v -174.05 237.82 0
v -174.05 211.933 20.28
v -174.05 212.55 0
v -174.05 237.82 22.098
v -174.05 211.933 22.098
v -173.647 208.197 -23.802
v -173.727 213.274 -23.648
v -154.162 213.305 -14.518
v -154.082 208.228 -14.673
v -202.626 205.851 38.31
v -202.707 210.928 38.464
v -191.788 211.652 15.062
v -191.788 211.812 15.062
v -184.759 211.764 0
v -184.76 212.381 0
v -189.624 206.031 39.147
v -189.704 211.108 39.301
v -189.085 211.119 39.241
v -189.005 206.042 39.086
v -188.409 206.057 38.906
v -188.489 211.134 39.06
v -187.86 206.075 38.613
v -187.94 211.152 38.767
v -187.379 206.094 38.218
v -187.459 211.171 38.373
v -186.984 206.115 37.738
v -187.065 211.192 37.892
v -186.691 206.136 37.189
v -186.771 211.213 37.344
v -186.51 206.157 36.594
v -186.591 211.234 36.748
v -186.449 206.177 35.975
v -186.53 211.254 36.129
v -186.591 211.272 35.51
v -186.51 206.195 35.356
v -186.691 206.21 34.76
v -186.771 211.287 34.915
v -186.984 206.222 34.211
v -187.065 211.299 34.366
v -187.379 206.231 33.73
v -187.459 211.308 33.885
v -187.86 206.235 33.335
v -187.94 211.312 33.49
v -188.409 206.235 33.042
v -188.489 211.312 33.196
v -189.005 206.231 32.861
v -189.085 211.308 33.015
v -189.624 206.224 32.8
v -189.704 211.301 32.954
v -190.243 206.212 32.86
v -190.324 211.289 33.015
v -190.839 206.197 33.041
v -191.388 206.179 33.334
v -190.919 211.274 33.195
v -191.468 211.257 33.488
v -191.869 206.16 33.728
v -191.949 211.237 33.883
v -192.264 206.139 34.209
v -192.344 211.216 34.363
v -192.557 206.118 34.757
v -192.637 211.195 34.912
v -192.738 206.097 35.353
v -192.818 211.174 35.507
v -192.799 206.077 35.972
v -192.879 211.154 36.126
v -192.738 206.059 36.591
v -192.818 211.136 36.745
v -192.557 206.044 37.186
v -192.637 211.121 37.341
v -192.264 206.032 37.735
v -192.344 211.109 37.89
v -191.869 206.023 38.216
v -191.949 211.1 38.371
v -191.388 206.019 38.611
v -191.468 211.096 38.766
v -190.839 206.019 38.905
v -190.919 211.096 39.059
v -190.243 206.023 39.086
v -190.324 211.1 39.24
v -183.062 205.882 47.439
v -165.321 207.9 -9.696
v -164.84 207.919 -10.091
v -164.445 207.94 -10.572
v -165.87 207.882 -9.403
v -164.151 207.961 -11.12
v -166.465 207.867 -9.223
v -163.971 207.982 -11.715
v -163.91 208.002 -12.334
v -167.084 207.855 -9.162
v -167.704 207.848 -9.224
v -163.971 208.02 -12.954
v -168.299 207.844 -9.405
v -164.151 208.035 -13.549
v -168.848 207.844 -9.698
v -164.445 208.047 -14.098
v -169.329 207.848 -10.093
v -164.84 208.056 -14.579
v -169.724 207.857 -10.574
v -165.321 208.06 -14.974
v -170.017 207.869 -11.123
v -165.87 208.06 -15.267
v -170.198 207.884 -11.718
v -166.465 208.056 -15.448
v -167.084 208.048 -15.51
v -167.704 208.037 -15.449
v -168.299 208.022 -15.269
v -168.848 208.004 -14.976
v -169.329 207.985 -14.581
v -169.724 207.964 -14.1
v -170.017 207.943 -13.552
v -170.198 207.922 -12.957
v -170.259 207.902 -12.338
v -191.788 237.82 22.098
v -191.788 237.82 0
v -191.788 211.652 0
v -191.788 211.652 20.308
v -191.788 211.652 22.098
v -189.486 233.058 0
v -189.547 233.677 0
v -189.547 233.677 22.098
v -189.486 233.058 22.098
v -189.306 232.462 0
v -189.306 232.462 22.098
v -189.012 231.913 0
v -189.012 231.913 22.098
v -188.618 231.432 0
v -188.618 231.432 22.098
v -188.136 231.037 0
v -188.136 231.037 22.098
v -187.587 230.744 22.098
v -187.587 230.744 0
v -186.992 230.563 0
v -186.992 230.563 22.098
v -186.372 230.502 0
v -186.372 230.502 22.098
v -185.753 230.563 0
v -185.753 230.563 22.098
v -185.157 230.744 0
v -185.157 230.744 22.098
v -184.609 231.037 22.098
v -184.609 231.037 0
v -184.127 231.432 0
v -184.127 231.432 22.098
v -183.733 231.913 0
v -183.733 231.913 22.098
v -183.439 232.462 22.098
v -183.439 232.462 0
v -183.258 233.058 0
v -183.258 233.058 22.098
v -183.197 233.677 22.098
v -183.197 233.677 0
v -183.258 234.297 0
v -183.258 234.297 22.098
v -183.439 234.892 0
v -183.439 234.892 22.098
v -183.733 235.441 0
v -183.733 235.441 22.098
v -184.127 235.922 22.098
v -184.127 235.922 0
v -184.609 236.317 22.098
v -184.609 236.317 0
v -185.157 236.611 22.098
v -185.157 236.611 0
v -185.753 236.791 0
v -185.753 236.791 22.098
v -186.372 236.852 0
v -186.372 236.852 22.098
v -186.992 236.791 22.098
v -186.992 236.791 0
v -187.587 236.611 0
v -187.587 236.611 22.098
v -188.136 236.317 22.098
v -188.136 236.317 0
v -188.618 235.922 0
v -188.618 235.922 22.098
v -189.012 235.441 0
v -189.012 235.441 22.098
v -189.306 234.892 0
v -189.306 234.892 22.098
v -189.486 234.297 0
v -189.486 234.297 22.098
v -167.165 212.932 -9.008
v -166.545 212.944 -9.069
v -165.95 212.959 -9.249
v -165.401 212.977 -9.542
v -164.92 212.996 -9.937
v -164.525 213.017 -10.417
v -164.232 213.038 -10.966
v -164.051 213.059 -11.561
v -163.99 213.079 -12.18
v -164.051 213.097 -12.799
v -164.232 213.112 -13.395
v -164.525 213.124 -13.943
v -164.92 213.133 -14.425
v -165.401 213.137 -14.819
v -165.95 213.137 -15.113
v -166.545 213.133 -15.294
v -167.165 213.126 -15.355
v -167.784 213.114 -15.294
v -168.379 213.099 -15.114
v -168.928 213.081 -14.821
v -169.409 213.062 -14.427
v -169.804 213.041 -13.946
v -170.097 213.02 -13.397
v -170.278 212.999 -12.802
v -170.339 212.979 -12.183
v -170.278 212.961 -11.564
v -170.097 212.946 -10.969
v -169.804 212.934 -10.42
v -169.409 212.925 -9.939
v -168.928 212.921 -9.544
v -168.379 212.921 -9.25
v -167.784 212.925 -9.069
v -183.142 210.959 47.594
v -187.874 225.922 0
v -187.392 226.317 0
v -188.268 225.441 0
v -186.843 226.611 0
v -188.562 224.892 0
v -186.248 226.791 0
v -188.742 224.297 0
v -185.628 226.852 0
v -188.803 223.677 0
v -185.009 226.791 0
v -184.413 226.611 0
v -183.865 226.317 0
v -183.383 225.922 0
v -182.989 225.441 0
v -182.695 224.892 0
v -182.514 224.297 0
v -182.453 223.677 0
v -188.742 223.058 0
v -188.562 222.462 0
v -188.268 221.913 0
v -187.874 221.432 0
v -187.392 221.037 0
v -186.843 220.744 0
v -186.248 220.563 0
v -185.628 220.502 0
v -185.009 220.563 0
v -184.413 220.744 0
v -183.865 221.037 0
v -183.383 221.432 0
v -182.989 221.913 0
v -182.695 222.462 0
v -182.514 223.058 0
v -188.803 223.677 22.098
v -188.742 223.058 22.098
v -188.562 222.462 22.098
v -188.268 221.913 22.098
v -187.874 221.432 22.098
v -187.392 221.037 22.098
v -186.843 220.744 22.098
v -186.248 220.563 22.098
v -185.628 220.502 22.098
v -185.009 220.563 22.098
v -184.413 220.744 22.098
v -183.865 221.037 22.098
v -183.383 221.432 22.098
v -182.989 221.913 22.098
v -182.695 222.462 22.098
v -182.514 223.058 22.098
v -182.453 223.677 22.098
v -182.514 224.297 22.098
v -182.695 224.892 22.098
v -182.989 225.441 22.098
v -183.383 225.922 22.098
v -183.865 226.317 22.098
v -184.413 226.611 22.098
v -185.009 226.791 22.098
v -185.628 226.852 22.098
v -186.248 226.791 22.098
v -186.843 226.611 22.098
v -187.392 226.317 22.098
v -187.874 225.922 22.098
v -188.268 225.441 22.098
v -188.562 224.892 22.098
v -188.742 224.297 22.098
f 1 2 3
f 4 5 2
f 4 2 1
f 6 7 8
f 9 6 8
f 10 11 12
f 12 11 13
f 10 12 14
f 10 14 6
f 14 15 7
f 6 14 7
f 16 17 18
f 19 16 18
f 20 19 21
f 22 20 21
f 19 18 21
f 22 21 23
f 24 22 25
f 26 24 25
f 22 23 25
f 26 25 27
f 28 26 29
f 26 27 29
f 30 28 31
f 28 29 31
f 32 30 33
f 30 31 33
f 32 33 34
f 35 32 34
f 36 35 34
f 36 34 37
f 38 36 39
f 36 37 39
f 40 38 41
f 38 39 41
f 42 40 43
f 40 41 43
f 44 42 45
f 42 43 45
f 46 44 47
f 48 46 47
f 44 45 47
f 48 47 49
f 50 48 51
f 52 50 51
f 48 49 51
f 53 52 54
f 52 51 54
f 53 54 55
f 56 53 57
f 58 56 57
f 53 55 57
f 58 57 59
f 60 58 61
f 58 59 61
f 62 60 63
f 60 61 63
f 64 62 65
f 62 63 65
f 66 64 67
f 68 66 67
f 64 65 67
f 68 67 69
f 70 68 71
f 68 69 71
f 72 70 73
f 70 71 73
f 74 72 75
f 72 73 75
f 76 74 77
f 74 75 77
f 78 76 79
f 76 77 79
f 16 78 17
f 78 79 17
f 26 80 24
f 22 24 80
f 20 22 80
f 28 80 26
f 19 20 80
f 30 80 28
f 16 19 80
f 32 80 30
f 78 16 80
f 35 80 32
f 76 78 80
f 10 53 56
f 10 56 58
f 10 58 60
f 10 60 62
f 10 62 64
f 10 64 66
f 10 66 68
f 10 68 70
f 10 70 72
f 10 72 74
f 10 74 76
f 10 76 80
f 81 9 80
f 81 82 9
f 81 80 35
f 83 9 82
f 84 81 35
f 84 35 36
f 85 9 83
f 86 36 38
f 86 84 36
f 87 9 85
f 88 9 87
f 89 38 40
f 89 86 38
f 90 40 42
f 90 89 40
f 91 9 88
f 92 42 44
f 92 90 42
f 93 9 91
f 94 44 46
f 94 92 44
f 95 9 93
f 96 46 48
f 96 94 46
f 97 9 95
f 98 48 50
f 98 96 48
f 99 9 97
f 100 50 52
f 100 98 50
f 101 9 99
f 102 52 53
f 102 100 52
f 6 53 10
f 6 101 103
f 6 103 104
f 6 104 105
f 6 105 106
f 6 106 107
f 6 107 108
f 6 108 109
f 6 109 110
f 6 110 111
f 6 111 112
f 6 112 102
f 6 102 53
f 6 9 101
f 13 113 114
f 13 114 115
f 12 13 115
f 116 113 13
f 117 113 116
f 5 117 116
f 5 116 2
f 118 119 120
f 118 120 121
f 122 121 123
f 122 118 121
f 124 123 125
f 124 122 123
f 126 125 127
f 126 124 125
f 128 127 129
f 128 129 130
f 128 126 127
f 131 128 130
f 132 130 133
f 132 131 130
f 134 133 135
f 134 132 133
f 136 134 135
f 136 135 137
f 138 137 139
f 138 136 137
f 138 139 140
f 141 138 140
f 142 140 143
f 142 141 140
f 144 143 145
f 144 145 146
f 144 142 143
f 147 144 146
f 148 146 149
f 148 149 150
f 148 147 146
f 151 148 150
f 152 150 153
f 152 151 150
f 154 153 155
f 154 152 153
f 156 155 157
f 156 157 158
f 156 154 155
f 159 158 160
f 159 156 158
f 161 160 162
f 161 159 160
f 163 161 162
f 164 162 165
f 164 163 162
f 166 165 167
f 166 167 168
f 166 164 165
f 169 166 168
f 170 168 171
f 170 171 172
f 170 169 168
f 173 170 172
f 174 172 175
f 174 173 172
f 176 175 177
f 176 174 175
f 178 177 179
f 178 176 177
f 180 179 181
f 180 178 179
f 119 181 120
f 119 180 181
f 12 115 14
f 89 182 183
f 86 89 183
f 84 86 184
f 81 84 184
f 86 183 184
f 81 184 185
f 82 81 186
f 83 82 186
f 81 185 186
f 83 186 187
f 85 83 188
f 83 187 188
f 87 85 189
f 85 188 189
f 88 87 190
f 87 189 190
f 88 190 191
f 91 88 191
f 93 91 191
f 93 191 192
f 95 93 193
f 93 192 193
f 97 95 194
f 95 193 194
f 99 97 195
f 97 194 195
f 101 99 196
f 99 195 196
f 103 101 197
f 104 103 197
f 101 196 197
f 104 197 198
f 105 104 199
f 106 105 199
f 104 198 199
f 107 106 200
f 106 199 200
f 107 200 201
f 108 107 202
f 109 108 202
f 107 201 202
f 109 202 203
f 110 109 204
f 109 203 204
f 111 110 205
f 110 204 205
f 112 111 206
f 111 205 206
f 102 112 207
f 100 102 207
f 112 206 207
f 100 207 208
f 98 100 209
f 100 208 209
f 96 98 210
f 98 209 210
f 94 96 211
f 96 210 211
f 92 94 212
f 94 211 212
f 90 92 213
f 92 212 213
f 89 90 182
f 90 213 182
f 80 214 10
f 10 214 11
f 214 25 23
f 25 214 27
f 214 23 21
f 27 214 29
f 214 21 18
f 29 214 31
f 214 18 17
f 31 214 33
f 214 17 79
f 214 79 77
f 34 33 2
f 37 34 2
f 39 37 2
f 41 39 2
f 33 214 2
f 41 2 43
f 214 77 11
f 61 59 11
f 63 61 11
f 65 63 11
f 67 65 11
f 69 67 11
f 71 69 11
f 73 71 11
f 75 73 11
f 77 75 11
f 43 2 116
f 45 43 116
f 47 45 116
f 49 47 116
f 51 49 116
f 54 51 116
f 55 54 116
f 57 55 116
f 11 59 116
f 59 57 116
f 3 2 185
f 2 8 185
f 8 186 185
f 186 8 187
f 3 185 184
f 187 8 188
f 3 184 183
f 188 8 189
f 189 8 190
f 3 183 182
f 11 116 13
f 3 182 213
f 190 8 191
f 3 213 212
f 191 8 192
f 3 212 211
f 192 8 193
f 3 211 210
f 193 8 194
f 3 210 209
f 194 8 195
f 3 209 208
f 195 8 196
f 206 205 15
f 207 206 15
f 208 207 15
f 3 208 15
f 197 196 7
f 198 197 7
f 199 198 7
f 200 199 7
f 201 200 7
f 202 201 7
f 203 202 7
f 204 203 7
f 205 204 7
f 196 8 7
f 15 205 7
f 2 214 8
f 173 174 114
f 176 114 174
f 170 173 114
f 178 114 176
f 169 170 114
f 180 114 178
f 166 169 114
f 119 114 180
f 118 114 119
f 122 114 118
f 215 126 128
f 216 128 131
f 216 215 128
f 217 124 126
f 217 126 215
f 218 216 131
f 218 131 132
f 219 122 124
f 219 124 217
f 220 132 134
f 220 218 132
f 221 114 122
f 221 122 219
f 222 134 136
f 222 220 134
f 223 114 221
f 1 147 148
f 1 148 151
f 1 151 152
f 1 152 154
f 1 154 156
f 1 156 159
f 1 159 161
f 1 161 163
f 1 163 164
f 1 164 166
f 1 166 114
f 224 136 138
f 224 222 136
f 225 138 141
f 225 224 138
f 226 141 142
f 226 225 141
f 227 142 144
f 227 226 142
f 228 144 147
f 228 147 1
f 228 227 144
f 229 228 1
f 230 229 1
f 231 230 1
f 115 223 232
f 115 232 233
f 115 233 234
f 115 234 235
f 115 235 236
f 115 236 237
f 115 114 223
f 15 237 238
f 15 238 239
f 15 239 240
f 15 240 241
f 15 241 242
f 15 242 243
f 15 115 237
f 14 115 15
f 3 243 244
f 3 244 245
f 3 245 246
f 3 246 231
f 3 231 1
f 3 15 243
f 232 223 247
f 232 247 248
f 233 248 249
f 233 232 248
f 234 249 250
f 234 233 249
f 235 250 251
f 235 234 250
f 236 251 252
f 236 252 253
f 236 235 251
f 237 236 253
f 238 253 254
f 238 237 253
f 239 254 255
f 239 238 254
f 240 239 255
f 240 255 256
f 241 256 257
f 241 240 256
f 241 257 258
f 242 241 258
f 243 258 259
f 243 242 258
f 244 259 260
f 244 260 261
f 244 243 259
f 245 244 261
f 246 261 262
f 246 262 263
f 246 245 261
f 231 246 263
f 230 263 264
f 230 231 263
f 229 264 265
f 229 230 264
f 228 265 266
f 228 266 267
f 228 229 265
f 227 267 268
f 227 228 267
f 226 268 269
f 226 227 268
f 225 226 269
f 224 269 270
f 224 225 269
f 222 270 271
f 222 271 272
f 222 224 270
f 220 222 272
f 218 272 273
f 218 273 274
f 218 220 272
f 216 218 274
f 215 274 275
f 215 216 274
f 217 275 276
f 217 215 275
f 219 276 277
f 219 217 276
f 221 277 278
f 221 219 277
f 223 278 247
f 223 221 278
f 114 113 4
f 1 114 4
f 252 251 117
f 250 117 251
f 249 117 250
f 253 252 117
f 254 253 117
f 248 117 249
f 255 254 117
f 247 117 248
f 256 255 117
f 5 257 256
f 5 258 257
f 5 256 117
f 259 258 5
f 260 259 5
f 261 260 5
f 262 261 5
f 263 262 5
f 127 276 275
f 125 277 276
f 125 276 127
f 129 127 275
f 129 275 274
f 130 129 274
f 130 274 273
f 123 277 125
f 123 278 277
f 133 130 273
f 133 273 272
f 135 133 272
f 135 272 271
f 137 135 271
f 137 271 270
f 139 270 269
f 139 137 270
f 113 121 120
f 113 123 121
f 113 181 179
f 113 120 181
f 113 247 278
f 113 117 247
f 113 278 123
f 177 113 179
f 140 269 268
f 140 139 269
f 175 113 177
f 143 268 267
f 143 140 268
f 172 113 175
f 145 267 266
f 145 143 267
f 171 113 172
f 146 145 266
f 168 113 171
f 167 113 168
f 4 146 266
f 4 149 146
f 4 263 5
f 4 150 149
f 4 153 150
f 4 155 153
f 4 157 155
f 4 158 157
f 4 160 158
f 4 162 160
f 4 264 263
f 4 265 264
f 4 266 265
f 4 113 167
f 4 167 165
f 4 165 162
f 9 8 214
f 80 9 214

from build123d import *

# Parameters (mm, degrees)
SKETCH1_W           = 17.738061562
SKETCH1_H           = 25.606233094
SKETCH1_R           = 3.175
BOSS_EXTRUDE1_DEPTH = 22.098
SKETCH2_R           = 3.175
BOSS_EXTRUDE2_DEPTH = 5.08
BOSS_EXTRUDE3_REACH = 317.84


with BuildPart() as part:
    # Sketch1 → Boss-Extrude1 (new body)
    with BuildSketch(Plane.XY):
        with Locations((-182.918624156, 225.016931251)):
            Rectangle(SKETCH1_W, SKETCH1_H)
        with Locations(Location((-185.628460018, 223.67720197, 0), (0, 0, 180))):
            Circle(SKETCH1_R, mode=Mode.SUBTRACT)
        with Locations(Location((-186.37244208, 233.67720197, 0), (0, 0, 180))):
            Circle(SKETCH1_R, mode=Mode.SUBTRACT)
    extrude(amount=BOSS_EXTRUDE1_DEPTH)

    # Sketch2 → Boss-Extrude2 (add)
    with BuildSketch(Plane(origin=(-3.393321114, 215.043841855, 6.540236681), x_dir=(0.9998756392437432, 0.015763128213975224, 0.00047941195833239283), z_dir=(-0.01577041682759253, 0.9994135267149823, 0.030395666997209747))):
        Polygon((-199.337975212, -32.034415653), (-170.354814822, 30.120172382), (-150.787629699, 20.995844111), (-179.77079009, -41.158743924), align=None)
        with Locations(Location((-186.334031496, -29.690514452, 0), (0, 0, 270))):
            Circle(SKETCH2_R, mode=Mode.SUBTRACT)
        with Locations(Location((-163.791573415, 18.651942909, 0), (0, 0, 270))):
            Circle(SKETCH2_R, mode=Mode.SUBTRACT)
    extrude(amount=-BOSS_EXTRUDE2_DEPTH)

    # Boss-Extrude3: up to this face of the body (flat: up to its plane)
    boss_extrude3_end = Plane(part.part.faces().sort_by_distance((-182.444308909, 224.507634503, 0))[0])
    # Sketch3 → Boss-Extrude3 (add, up to the picked face)
    with BuildSketch(Plane.XY.offset(22.098), mode=Mode.PRIVATE) as boss_extrude3_sk1:
        Polygon((-191.787654937, 212.213814704), (-191.787654937, 211.652316966), (-174.049593375, 211.933065835), (-174.049593375, 212.213814704), align=None)
    boss_extrude3_tool1 = split(extrude(boss_extrude3_sk1.sketch, amount=-BOSS_EXTRUDE3_REACH, mode=Mode.PRIVATE), bisect_by=boss_extrude3_end, keep=Keep.BOTH, mode=Mode.PRIVATE)
    add(boss_extrude3_tool1.solids().sort_by(Axis((-183.904072, 211.995454, 22.098), (0, 0, -1)))[0])


solid = part.part
